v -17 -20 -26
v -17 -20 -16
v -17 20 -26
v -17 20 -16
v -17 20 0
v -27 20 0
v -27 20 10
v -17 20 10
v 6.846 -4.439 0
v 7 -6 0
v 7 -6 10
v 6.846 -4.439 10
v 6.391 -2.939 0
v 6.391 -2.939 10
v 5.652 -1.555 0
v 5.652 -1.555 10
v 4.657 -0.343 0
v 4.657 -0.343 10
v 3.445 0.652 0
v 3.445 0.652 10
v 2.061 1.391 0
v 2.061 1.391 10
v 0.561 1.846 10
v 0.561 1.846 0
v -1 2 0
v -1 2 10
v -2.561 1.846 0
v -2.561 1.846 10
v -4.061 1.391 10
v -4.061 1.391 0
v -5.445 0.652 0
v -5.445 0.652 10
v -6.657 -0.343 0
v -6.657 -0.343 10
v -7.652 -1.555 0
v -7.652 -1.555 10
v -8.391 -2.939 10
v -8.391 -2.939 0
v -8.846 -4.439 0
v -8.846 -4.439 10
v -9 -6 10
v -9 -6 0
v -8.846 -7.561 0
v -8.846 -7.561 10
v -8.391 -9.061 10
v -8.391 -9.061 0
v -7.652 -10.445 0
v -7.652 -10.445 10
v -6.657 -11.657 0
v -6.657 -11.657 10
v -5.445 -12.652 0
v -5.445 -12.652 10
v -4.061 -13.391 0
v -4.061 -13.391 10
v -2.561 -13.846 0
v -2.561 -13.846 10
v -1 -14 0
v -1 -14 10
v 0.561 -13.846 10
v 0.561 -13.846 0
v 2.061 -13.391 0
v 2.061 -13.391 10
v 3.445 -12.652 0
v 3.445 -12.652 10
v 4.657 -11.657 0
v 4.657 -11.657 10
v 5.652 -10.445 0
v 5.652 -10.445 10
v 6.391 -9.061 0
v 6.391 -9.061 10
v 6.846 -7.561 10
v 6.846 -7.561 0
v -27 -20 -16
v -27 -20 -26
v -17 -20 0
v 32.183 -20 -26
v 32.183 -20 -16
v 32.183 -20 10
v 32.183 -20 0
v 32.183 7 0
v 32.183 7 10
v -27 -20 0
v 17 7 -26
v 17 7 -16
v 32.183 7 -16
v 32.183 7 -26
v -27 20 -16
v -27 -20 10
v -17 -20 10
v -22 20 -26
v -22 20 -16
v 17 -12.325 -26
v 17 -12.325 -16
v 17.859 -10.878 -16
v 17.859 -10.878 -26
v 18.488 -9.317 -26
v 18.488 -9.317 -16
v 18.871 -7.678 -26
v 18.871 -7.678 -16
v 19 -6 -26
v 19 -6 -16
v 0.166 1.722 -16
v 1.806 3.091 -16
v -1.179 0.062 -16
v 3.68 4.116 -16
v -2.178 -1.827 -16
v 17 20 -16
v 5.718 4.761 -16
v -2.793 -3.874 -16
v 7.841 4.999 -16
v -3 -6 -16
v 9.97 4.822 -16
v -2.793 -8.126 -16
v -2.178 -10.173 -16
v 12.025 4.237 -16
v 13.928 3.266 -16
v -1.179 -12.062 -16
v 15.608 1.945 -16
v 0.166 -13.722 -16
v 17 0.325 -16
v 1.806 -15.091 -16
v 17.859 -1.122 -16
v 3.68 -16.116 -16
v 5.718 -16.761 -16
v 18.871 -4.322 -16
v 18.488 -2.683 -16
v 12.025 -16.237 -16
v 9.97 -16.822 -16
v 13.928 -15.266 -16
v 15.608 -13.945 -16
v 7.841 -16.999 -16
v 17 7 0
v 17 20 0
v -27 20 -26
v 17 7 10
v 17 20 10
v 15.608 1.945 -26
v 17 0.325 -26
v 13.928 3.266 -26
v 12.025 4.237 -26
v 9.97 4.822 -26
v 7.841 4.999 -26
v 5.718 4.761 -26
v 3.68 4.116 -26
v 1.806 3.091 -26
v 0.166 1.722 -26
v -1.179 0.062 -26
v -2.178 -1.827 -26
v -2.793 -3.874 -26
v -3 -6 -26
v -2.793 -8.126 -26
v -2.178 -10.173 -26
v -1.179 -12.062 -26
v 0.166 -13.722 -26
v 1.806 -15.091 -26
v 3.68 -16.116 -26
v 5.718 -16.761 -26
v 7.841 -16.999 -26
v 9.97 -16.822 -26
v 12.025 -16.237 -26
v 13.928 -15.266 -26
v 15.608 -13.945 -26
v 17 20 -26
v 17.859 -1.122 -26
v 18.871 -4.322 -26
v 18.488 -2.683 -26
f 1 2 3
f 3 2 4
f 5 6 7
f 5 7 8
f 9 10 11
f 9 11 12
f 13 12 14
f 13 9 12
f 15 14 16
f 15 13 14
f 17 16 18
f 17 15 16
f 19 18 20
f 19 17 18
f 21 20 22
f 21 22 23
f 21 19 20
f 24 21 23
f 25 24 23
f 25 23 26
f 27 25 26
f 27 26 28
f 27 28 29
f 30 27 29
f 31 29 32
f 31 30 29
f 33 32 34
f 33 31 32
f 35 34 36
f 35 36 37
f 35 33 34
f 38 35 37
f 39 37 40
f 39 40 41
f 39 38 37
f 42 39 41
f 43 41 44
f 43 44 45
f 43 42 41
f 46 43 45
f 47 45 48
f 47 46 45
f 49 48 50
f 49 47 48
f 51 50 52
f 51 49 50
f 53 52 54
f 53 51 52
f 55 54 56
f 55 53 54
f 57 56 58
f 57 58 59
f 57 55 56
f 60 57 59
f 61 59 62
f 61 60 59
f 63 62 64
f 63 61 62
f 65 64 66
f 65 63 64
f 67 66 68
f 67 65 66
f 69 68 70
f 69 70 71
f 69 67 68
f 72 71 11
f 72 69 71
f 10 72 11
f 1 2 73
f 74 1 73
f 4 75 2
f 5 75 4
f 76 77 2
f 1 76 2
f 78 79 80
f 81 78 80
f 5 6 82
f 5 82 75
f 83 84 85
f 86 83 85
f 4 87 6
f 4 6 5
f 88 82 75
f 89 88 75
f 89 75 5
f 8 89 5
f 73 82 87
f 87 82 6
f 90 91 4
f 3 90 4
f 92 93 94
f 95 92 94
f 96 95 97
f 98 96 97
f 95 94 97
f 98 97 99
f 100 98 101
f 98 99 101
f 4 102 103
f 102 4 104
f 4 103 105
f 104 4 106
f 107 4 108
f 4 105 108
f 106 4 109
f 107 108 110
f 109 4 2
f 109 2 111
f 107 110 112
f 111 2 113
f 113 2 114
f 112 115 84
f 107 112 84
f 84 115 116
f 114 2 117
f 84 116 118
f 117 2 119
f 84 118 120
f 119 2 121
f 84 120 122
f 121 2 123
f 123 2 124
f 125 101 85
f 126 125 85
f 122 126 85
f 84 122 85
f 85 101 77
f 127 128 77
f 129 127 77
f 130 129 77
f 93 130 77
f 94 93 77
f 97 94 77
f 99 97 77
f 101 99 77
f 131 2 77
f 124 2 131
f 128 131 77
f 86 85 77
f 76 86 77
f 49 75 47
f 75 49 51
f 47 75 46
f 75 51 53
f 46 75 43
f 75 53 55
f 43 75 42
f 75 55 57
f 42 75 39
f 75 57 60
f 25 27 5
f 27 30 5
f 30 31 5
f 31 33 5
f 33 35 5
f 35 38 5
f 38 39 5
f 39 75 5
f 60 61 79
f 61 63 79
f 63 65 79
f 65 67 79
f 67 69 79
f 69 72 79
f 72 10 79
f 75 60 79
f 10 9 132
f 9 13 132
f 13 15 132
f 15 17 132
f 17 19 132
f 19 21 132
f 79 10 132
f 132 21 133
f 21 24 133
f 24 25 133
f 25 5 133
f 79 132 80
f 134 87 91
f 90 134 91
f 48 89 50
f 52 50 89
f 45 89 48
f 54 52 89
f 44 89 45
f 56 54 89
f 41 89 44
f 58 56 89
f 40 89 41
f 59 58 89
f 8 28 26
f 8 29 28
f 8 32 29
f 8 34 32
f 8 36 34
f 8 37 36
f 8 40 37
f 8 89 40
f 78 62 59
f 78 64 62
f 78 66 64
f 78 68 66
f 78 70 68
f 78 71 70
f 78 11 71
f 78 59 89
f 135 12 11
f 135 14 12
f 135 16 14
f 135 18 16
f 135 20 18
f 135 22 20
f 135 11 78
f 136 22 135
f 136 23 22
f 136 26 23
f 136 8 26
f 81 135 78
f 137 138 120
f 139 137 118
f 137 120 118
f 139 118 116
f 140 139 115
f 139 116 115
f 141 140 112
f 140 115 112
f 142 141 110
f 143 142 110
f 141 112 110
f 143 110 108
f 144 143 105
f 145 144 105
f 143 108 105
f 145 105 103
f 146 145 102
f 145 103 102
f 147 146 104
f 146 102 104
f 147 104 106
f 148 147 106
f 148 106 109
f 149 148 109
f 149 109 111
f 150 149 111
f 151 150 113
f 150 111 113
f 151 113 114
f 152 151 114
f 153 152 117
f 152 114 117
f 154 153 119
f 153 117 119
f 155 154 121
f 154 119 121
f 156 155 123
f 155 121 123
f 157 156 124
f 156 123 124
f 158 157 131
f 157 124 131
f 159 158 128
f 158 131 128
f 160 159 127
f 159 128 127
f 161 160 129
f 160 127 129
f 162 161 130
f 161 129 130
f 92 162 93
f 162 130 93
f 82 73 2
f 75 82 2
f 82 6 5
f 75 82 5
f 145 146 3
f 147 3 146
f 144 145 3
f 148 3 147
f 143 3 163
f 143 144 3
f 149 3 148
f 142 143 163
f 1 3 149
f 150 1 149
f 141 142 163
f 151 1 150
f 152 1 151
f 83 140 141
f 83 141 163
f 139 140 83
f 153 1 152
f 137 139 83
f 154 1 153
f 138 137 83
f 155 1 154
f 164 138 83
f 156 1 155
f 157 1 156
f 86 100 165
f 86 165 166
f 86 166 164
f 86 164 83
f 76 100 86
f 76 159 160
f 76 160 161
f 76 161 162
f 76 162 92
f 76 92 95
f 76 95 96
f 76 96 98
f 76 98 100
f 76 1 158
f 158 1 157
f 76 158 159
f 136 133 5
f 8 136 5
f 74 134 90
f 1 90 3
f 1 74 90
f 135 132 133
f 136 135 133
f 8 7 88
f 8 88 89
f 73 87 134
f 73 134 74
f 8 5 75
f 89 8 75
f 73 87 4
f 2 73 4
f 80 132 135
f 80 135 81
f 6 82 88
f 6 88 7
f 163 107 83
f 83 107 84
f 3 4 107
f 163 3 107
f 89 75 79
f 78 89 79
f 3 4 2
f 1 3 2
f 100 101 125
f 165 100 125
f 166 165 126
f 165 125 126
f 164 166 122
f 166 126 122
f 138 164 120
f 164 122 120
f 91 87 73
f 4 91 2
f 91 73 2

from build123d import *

# Parameters (mm, degrees)
F0_R     = 8
F0_W     = 15.1825966239
F0_H     = 27
F1_DEPTH = 10
F0_W_2   = 10
F0_H_2   = 40
F2_DEPTH = 16
F3_DEPTH = 10
F5_DEPTH = 10
F4_W     = 5
F4_H     = 40.000000447
F4_H_2   = 40
F6_DEPTH = 10


# Not quite as in the source:
# - ends of sketch curves that miss each other by under 0.0002 mm in the source are joined


with BuildPart() as f1:
    # F0 (on Top) → F1 (new body)
    with BuildSketch(Plane.XY):
        Polygon((17, 20), (-17, 20), (-17, -20), (17, -20), (17, 7), align=None)
        with Locations((-1, -6)):
            Circle(F0_R, mode=Mode.SUBTRACT)
        with Locations((24.5912983119, -6.5)):
            Rectangle(F0_W, F0_H)
    extrude(amount=F1_DEPTH)


with BuildPart() as f2:
    # F0 (on Top) → F2 (new body)
    with BuildSketch(Plane.XY):
        with Locations((-22, 0)):
            Rectangle(F0_W_2, F0_H_2)
    extrude(amount=-F2_DEPTH)

    # F4 (on face) → F5 (join)
    with BuildSketch(Plane(origin=(0, 0, -16), x_dir=(1, 0, 0), z_dir=(0, 0, -1))):
        with BuildLine():
            Line((-17, 20.000000447), (-17, -19.999999553))
            Line((-17, -19.999999553), (17, -19.999999553))
            Line((17, -19.999999553), (17, -6.999999553))
            Line((17, -6.999999553), (17, -0.3245548733))
            ThreePointArc((17, -0.3245548733), (-3, 6.000000447), (17, 12.3245557674))
            Line((17, 12.3245557674), (17, 20.000000447))
            Line((17, 20.000000447), (-17, 20.000000447))
        make_face()
        with BuildLine():
            Line((17, -0.3245548733), (17, -6.999999553))
            Line((17, -6.999999553), (32.1825966239, -6.999999553))
            Line((32.1825966239, -6.999999553), (32.1825966239, 20.000000447))
            Line((32.1825966239, 20.000000447), (17, 20.000000447))
            Line((17, 20.000000447), (17, 12.3245557674))
            ThreePointArc((17, 12.3245557674), (18.4880884817, 9.3166252374), (19, 6.000000447))
            ThreePointArc((19, 6.000000447), (18.4880884817, 2.6833756567), (17, -0.3245548733))
        make_face()
    extrude(amount=F5_DEPTH)


with BuildPart() as f3:
    # F0 (on Top) → F3 (new body)
    with BuildSketch(Plane.XY):
        with Locations((-22, 0)):
            Rectangle(F0_W_2, F0_H_2)
    extrude(amount=F3_DEPTH)


with BuildPart() as f6:
    # F4 (on face) → F6 (new body)
    with BuildSketch(Plane(origin=(0, 0, -16), x_dir=(1, 0, 0), z_dir=(0, 0, -1))):
        with Locations((-19.5, 2.235e-07)):
            Rectangle(F4_W, F4_H)
        with Locations((-24.5, 4.47e-07)):
            Rectangle(F4_W, F4_H_2)
    extrude(amount=F6_DEPTH)


solid = Compound([f1.part, f2.part, f3.part, f6.part])
